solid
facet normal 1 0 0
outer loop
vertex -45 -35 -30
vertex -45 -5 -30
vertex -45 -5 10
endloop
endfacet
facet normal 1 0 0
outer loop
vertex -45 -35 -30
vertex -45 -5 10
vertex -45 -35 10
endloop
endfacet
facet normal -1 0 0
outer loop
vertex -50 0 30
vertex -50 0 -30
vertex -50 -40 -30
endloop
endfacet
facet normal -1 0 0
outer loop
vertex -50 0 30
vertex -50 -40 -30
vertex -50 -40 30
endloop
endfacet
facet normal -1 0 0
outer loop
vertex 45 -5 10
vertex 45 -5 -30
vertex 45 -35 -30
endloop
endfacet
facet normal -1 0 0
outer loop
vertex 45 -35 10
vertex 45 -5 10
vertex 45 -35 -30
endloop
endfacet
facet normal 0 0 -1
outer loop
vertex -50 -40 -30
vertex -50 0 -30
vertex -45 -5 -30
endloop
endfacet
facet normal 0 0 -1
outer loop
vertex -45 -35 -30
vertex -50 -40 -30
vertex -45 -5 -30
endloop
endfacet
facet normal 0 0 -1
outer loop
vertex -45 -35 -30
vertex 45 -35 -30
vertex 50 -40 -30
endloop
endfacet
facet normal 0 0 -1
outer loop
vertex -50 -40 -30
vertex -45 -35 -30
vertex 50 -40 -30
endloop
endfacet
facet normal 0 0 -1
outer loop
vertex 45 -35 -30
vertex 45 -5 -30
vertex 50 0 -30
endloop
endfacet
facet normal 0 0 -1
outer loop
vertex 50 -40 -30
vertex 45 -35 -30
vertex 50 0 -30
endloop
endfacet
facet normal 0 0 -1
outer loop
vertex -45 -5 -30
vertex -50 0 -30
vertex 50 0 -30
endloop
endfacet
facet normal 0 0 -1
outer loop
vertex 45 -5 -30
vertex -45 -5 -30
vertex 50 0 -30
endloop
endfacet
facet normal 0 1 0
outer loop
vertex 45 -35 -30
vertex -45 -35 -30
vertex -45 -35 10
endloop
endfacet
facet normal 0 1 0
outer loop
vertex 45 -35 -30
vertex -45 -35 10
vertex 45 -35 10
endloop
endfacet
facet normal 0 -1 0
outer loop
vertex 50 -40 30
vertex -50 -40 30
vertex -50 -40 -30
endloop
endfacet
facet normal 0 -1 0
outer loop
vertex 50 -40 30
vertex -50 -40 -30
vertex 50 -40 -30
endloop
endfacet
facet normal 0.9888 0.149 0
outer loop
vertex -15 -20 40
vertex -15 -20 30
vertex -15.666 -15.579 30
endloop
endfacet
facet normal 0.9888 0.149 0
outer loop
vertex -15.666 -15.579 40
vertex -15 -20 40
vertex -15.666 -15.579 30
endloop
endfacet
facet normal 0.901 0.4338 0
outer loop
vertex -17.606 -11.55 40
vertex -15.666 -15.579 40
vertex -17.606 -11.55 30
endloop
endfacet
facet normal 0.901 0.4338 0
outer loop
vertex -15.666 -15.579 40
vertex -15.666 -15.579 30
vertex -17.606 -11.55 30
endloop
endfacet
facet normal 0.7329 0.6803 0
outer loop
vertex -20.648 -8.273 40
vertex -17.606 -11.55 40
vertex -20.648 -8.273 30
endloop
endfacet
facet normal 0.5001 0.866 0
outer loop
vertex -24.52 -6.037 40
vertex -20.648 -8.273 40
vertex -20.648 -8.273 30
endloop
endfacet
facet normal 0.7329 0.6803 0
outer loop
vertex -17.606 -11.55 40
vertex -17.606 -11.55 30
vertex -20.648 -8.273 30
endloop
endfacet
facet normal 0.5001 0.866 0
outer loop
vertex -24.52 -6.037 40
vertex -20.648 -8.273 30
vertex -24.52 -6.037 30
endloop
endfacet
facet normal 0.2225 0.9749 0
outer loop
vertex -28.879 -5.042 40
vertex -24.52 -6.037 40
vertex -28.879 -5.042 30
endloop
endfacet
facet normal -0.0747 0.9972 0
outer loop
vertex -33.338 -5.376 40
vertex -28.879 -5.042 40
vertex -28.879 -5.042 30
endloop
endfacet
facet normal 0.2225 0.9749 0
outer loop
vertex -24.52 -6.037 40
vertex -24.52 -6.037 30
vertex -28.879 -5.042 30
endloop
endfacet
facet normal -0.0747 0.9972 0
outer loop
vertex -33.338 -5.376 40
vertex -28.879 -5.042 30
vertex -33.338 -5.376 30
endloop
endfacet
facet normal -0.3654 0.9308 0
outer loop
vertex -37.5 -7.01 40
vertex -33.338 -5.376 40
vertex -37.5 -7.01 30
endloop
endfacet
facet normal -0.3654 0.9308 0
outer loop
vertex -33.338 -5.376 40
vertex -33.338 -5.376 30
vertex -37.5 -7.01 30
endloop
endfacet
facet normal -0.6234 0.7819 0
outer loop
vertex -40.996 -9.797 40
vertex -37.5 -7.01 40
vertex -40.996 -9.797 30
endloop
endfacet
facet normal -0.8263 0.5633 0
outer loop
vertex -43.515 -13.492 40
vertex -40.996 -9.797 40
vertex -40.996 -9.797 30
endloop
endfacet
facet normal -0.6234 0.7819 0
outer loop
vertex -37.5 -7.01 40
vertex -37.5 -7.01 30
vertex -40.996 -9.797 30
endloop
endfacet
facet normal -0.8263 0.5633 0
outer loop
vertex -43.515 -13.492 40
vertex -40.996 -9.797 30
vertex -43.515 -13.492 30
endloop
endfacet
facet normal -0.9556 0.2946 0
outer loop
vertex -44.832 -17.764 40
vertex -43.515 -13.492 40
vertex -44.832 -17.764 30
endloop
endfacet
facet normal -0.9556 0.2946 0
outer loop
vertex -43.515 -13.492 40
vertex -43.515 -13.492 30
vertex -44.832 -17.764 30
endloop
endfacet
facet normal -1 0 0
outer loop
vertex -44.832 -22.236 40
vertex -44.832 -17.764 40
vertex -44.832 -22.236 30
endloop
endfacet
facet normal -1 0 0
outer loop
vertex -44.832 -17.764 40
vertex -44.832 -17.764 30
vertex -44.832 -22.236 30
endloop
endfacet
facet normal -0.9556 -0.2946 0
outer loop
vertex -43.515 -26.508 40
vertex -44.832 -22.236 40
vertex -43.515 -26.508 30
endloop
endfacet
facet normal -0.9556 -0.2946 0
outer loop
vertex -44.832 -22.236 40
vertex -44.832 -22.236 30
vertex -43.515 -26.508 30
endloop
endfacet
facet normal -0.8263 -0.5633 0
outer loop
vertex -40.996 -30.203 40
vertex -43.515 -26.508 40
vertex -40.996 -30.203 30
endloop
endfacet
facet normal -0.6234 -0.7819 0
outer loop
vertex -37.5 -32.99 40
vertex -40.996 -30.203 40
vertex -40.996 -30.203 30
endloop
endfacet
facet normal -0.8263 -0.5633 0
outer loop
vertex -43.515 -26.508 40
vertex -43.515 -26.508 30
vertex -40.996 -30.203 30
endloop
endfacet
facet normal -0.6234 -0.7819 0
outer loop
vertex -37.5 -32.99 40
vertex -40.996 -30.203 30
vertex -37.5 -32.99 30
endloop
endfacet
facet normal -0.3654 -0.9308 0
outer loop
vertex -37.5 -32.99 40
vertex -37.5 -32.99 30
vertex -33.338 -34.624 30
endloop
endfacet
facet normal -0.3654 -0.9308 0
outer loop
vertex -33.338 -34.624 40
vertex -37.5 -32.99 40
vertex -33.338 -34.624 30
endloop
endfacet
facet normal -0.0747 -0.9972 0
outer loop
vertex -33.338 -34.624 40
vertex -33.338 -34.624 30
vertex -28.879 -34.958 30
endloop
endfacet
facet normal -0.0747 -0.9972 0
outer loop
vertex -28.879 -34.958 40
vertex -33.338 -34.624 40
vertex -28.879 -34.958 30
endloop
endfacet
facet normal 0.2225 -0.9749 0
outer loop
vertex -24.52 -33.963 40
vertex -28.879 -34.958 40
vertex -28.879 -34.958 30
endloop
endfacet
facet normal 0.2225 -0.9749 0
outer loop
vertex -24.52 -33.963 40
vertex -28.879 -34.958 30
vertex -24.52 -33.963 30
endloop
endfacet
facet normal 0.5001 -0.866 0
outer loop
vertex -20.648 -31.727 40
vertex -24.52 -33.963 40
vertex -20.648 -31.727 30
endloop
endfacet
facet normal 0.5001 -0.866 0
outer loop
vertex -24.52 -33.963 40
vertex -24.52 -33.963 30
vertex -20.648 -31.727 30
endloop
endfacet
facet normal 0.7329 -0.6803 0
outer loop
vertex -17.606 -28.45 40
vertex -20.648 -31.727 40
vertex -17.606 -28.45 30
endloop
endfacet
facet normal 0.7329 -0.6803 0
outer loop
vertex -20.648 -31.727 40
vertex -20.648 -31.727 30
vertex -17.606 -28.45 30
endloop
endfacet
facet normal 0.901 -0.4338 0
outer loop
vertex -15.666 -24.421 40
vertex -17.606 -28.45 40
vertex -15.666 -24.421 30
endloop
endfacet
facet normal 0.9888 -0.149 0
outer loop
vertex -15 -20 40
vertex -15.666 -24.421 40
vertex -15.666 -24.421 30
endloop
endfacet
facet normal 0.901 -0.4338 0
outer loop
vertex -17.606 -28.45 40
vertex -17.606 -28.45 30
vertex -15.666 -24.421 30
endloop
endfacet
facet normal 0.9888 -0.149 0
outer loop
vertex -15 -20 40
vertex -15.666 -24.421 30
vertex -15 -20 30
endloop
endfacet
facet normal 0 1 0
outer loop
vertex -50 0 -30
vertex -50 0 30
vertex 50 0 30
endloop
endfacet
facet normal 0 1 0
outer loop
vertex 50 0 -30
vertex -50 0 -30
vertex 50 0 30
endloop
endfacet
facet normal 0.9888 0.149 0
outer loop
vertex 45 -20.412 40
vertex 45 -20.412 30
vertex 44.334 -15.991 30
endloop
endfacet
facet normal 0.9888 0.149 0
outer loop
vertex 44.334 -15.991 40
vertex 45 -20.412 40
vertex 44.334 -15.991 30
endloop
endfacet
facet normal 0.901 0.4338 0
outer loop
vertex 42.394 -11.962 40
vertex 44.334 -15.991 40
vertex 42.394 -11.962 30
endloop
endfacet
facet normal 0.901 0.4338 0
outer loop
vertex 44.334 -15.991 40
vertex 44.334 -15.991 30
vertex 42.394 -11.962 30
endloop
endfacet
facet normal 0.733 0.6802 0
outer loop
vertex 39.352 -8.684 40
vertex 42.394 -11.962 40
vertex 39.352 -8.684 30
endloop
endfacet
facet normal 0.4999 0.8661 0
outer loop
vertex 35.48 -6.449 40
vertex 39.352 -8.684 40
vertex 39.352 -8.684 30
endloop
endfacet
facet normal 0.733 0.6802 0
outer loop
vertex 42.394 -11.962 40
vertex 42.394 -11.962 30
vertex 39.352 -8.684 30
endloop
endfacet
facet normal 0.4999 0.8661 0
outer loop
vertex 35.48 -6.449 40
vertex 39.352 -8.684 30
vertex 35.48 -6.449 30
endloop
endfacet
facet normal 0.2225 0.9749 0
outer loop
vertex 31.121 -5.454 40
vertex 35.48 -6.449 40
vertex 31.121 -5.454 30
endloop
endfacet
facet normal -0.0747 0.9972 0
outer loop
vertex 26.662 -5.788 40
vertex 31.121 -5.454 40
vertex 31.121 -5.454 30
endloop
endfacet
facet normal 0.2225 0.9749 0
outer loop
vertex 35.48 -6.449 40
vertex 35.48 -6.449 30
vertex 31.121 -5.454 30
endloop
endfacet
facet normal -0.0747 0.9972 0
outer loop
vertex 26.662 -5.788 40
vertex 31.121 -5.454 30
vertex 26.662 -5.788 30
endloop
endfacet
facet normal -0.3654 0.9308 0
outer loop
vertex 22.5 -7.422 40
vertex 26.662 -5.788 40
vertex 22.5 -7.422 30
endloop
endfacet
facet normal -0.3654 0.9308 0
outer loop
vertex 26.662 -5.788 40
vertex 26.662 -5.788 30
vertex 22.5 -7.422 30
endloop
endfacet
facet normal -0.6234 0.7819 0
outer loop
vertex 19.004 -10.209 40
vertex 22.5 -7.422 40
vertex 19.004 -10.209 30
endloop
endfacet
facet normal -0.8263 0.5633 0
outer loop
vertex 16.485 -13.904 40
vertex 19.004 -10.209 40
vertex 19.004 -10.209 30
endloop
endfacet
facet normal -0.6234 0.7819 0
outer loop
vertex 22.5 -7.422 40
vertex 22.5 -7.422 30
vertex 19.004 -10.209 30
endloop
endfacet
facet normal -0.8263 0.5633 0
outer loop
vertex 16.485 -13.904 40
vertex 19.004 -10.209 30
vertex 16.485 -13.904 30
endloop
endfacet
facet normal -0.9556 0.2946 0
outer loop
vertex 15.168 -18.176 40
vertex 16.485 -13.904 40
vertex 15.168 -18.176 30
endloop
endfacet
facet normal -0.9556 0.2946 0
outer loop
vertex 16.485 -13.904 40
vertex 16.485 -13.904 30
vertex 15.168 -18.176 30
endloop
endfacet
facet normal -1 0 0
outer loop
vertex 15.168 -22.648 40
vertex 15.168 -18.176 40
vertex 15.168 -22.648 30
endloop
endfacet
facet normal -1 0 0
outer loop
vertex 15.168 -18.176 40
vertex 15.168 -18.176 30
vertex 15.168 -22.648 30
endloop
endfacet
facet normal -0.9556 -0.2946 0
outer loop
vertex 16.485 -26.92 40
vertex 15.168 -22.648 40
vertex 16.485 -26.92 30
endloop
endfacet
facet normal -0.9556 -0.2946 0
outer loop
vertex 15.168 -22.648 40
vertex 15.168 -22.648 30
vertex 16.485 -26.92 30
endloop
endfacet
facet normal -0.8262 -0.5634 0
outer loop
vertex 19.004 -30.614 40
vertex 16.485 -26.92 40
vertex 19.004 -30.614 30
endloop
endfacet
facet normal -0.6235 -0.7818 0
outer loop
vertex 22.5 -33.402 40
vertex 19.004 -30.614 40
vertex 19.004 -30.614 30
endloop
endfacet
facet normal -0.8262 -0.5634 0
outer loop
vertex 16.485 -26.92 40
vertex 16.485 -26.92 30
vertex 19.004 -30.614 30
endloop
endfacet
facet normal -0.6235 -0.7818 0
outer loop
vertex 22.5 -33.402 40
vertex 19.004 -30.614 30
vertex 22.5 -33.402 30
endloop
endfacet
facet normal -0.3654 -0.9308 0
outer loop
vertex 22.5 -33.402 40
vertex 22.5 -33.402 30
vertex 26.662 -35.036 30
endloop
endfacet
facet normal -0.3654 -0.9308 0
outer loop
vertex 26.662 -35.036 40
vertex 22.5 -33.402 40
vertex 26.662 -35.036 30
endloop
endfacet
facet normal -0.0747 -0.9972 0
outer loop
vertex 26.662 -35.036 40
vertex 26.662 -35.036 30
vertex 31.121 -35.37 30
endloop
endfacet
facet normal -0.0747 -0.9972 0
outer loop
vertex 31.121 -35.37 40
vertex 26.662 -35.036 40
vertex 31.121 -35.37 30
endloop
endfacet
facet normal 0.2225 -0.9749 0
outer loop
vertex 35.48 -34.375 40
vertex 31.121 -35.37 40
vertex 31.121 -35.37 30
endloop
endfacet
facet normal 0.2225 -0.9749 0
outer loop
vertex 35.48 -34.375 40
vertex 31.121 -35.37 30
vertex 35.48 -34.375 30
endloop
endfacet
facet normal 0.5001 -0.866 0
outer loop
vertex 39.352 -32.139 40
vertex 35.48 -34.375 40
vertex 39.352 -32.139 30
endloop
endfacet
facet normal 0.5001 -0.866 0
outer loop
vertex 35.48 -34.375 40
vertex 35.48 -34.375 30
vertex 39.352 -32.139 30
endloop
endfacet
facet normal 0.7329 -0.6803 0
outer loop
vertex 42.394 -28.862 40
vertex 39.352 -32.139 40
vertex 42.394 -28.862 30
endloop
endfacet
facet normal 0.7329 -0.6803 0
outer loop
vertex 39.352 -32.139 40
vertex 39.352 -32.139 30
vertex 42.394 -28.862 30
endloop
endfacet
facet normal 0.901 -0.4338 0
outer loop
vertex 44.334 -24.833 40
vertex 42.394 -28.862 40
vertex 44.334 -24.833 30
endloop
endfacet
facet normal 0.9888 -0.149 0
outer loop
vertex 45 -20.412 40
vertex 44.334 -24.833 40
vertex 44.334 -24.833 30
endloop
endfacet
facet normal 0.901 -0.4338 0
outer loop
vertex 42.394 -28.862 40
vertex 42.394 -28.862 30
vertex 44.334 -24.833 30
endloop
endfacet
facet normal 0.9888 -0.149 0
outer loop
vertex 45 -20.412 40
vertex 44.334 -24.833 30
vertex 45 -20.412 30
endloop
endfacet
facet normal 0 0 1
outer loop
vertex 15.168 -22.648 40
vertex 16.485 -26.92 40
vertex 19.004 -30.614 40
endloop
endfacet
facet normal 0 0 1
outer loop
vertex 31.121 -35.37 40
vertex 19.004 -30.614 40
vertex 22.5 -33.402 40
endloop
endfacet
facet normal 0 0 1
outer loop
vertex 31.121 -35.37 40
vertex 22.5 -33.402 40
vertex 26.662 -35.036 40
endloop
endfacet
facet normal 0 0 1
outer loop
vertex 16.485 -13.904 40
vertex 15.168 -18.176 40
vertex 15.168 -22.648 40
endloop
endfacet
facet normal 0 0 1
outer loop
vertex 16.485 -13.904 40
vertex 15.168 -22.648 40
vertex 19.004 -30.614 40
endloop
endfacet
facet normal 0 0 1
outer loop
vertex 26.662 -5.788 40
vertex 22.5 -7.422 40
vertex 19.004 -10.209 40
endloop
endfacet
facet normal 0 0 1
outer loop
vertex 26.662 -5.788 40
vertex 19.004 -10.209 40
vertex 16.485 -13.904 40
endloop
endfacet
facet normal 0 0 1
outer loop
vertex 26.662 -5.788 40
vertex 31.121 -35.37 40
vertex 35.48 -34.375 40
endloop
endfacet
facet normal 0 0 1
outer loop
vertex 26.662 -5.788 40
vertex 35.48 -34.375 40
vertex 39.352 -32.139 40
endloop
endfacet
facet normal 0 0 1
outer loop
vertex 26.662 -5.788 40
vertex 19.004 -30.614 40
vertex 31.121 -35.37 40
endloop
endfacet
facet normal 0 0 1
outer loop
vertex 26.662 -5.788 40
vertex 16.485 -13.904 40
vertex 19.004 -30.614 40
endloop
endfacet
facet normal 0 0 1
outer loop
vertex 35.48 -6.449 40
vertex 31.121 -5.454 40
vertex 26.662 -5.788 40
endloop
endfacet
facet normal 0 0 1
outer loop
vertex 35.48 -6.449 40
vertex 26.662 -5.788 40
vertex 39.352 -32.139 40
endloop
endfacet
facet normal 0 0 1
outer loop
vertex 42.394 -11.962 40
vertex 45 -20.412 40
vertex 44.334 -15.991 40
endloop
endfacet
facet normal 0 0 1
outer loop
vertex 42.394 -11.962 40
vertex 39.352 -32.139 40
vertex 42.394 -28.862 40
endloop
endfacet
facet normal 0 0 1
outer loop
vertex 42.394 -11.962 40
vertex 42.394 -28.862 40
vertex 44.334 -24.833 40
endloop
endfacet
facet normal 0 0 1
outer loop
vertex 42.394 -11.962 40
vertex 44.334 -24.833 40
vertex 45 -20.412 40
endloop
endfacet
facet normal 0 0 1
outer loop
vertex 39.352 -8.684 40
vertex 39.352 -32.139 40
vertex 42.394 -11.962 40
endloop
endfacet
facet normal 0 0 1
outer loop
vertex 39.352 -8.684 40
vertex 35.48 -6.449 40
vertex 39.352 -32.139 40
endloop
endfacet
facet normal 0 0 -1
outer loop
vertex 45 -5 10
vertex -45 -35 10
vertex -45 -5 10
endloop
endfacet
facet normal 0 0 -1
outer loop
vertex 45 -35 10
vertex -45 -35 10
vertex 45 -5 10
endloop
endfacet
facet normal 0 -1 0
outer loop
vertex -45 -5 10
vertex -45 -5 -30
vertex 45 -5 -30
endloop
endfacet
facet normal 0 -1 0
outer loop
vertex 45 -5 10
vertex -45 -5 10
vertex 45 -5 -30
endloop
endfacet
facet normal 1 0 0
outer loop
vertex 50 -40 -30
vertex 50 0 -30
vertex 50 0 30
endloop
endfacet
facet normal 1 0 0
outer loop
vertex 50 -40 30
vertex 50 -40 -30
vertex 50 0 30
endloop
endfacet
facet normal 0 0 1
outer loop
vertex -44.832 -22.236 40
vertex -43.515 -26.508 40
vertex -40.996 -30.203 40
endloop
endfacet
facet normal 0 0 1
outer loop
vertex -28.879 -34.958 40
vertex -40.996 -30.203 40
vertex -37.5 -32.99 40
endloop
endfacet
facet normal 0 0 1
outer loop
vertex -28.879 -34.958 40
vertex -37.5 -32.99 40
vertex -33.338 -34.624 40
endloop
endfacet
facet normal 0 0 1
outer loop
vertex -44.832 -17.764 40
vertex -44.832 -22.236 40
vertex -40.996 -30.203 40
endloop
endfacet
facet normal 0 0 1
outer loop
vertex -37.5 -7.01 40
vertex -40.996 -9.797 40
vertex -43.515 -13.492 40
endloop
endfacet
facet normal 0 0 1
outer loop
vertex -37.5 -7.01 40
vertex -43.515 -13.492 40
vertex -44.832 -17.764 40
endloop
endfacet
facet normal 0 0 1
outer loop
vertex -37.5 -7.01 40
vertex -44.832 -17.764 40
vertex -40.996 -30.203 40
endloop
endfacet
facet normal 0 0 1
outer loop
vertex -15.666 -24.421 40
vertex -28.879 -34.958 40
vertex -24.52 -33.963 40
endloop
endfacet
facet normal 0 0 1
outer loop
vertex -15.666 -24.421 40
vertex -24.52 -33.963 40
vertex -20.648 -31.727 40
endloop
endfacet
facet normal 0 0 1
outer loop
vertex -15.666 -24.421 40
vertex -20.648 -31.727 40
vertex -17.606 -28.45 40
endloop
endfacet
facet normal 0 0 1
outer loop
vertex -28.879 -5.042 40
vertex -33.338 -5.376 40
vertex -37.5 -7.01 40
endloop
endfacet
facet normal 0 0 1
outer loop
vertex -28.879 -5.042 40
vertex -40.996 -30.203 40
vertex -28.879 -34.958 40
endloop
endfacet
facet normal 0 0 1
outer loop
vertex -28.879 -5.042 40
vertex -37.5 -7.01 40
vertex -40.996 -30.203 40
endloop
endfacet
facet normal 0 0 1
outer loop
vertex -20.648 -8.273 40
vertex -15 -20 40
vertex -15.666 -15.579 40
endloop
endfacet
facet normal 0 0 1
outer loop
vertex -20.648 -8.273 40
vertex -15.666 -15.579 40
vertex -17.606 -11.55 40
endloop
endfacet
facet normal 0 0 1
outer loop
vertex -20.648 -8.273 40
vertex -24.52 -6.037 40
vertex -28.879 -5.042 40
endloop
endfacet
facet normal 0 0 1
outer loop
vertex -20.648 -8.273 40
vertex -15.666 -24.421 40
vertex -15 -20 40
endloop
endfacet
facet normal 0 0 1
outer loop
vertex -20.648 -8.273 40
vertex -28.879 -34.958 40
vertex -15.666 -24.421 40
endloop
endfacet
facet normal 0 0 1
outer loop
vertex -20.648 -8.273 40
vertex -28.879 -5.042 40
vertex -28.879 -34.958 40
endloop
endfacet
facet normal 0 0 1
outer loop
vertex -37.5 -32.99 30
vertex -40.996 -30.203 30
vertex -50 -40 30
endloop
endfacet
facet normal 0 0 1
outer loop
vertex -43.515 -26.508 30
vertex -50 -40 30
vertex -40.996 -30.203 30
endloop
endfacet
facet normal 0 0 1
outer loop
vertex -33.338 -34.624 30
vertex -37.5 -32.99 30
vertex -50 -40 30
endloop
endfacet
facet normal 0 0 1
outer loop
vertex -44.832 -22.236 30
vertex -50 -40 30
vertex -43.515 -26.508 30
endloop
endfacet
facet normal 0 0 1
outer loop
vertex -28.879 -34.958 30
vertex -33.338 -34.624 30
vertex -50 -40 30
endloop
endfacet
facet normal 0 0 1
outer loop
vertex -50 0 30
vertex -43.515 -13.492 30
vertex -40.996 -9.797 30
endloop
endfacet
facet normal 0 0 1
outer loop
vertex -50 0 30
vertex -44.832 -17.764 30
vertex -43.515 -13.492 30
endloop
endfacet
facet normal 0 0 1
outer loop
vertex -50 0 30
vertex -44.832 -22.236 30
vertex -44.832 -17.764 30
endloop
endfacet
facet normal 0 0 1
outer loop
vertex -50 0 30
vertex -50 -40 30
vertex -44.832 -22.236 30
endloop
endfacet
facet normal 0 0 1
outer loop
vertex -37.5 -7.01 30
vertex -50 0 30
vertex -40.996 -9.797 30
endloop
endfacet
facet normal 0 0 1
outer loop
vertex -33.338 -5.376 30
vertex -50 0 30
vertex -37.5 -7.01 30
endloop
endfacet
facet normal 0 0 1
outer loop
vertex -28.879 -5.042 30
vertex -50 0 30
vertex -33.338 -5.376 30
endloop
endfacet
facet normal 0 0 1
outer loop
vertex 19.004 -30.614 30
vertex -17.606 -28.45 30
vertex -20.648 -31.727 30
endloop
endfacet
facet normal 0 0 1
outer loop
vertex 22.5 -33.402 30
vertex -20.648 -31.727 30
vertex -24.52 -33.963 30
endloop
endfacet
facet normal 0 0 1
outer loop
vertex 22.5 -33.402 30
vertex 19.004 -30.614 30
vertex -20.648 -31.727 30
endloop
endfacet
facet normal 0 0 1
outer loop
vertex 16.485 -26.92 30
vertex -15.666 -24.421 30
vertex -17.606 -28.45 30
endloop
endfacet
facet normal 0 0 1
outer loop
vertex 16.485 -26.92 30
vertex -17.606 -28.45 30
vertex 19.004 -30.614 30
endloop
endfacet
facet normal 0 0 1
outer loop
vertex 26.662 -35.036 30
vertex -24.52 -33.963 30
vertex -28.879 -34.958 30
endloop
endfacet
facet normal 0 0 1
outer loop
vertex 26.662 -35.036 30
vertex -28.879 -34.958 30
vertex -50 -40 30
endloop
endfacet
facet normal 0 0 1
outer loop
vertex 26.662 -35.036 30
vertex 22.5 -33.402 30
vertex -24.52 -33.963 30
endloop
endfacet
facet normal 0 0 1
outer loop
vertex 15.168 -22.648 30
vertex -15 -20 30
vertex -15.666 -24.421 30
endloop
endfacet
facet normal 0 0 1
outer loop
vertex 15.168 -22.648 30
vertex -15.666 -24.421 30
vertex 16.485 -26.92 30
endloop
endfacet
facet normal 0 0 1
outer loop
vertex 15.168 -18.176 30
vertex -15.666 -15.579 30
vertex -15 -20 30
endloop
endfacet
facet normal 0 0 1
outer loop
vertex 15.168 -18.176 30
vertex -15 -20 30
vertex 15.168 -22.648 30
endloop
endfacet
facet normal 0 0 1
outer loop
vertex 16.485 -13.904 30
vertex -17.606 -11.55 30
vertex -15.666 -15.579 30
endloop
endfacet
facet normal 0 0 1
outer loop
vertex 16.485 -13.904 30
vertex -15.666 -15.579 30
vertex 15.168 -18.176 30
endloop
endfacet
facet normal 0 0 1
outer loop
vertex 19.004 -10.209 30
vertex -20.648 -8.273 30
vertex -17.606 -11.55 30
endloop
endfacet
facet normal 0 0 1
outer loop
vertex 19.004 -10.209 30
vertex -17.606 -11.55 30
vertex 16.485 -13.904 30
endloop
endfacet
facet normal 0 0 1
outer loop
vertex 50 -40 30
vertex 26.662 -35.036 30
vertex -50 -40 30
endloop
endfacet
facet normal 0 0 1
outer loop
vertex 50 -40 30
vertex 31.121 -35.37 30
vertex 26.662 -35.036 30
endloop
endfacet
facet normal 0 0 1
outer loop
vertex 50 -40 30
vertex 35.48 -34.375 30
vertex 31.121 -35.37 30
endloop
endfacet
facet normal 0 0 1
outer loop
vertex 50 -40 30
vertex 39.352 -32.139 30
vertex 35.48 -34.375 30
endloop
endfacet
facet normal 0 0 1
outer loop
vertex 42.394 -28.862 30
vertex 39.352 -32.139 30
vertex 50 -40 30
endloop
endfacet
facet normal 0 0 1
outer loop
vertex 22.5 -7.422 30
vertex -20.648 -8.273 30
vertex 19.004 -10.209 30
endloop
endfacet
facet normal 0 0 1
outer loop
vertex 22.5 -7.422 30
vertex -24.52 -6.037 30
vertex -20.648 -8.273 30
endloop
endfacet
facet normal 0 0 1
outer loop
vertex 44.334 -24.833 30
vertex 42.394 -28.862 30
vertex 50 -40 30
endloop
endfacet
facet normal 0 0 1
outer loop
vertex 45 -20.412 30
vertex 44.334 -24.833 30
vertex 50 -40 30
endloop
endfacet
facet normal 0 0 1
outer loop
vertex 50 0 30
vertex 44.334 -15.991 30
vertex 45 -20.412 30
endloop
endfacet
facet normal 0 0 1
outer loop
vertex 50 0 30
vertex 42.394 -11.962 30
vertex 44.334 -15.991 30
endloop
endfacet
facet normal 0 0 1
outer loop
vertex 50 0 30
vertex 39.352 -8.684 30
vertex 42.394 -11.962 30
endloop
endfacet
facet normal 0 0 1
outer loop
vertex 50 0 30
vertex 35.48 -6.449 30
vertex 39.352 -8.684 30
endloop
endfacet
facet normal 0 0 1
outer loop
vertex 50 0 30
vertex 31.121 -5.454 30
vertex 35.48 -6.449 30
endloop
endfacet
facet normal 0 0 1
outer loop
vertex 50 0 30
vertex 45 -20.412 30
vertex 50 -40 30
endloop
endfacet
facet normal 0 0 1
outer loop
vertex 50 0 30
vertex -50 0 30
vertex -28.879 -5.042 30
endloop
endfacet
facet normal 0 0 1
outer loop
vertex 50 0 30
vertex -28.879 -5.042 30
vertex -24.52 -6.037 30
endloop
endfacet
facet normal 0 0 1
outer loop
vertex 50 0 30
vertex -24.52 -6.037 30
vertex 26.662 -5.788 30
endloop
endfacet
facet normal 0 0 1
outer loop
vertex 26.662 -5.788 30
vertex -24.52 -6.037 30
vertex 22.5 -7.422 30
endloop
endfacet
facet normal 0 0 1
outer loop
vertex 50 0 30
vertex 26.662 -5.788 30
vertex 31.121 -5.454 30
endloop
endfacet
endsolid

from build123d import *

# Parameters (mm, degrees)
F0_W     = 100
F0_H     = 60
F1_DEPTH = 40
F3_R     = 15
F4_DEPTH = 10
F5_W     = 90
F5_H     = 30
F6_DEPTH = 40


with BuildPart() as f1:
    # F0 (on Front) → F1 (new body)
    with BuildSketch(Plane.XZ):
        Rectangle(F0_W, F0_H)
    extrude(amount=F1_DEPTH)

    # F3 (on face) → F4 (join)
    with BuildSketch(Plane.XY.offset(30)):
        with Locations((-30, -20)):
            Circle(F3_R)
        with Locations((30, -20.411897)):
            Circle(F3_R)
    extrude(amount=F4_DEPTH)

    # F5 (on face) → F6 (cut)
    with BuildSketch(Plane(origin=(0, 0, -30), x_dir=(1, 0, 0), z_dir=(0, 0, -1))):
        with Locations((0, 20)):
            Rectangle(F5_W, F5_H)
    extrude(amount=-F6_DEPTH, mode=Mode.SUBTRACT)


solid = f1.part
